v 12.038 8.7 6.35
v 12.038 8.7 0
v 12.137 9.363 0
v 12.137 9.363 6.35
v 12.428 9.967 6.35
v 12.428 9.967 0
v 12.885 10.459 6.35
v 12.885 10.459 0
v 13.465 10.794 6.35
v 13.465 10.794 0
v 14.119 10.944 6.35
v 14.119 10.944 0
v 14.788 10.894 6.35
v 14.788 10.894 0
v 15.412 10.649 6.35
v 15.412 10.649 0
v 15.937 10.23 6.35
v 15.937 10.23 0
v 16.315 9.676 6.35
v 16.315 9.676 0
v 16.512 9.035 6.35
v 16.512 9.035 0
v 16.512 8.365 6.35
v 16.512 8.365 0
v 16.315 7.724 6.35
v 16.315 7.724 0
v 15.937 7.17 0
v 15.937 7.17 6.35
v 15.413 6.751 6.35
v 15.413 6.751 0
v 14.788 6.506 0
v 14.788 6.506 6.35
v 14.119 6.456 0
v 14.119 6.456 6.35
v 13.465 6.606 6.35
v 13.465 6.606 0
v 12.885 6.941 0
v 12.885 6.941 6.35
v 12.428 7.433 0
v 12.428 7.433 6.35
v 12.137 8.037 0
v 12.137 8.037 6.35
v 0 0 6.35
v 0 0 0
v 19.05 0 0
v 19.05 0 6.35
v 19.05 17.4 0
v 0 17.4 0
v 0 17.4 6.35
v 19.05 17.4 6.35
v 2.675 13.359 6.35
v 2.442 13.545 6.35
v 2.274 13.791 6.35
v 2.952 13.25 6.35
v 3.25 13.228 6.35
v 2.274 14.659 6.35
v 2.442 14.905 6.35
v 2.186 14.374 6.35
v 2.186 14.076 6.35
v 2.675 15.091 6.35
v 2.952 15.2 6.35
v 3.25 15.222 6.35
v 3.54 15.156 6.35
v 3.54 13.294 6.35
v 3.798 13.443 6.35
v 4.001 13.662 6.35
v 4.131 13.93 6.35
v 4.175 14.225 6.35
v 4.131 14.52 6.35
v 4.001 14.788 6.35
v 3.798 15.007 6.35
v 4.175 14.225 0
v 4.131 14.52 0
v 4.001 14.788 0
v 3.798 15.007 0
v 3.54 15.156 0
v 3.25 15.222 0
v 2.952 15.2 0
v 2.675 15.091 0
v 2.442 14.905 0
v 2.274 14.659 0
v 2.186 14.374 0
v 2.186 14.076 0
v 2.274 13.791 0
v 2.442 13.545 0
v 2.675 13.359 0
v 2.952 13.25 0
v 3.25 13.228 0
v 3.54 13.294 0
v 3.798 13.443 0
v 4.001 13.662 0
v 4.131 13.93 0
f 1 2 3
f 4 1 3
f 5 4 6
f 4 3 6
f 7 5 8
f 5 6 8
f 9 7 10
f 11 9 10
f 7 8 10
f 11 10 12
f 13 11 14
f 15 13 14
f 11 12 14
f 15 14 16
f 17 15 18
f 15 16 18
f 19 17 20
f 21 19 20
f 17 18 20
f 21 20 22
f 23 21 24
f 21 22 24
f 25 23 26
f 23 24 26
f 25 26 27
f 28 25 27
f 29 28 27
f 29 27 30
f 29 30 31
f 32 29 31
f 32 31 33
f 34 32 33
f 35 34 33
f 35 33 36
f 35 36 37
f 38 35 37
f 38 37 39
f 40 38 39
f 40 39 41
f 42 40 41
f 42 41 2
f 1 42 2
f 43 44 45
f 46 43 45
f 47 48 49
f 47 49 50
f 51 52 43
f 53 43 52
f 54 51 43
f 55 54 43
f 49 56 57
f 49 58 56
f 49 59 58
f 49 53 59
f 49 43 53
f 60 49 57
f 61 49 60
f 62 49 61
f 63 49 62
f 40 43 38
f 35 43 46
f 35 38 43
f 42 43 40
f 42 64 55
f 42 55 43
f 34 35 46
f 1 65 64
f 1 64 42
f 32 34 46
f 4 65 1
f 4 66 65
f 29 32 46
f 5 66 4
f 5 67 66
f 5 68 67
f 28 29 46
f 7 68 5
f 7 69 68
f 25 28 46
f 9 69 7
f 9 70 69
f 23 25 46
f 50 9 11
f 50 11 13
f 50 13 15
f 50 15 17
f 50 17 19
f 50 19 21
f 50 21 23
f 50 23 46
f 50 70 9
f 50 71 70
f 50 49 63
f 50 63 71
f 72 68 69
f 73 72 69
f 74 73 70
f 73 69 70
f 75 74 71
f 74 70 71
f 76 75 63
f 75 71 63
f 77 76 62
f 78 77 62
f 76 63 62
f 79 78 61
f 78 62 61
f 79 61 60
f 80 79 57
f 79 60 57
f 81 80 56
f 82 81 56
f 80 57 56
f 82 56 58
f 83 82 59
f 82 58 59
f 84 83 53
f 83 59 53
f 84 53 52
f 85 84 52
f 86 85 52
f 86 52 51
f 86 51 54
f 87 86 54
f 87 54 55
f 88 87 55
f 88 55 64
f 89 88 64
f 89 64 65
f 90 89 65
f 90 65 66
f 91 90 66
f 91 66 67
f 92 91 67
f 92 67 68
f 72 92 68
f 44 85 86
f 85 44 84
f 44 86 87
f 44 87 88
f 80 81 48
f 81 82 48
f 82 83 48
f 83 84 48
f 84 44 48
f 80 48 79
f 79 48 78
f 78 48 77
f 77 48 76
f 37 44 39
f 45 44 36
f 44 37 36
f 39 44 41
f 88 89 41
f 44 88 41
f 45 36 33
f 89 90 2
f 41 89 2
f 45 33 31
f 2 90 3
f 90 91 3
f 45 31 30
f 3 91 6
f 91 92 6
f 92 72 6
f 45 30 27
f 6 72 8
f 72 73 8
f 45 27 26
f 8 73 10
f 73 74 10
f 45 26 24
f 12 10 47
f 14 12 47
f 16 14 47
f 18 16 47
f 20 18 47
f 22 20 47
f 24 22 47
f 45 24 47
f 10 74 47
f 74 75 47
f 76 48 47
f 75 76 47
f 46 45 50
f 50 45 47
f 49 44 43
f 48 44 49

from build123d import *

# Parameters (mm, degrees)
SKETCH1_W                = 19.05
SKETCH1_H                = 17.4
BOSS_EXTRUDE1_DEPTH      = 6.35
M4_CLEARANCE_HOLE1_D     = 4.5
M4_CLEARANCE_HOLE1_DEPTH = 12.7
M4_CLEARANCE_HOLE1_TIP   = 1.351936393
SKETCH4_R                = 1
CUT_EXTRUDE1_DEPTH       = 27.570378243


with BuildPart() as part:
    # Sketch1 → Boss-Extrude1 (new body)
    with BuildSketch(Plane.XY):
        with Locations((9.525, 8.7)):
            Rectangle(SKETCH1_W, SKETCH1_H)
    extrude(amount=BOSS_EXTRUDE1_DEPTH)

    # M4 Clearance Hole1
    with Locations(Plane.XY.offset(6.35)):
        with Locations((14.2875, 8.7)):
            Hole(M4_CLEARANCE_HOLE1_D / 2, depth=M4_CLEARANCE_HOLE1_DEPTH)
            with Locations((0, 0, -(M4_CLEARANCE_HOLE1_DEPTH + M4_CLEARANCE_HOLE1_TIP / 2))):  # 118° drill point
                Cone(0, M4_CLEARANCE_HOLE1_D / 2, M4_CLEARANCE_HOLE1_TIP, mode=Mode.SUBTRACT)

    # Sketch4 → Cut-Extrude1 (cut, through all)
    with BuildSketch(Plane.XY.offset(6.35)):
        with Locations((3.175, 14.225)):
            Circle(SKETCH4_R)
    extrude(amount=-CUT_EXTRUDE1_DEPTH, mode=Mode.SUBTRACT)


solid = part.part
